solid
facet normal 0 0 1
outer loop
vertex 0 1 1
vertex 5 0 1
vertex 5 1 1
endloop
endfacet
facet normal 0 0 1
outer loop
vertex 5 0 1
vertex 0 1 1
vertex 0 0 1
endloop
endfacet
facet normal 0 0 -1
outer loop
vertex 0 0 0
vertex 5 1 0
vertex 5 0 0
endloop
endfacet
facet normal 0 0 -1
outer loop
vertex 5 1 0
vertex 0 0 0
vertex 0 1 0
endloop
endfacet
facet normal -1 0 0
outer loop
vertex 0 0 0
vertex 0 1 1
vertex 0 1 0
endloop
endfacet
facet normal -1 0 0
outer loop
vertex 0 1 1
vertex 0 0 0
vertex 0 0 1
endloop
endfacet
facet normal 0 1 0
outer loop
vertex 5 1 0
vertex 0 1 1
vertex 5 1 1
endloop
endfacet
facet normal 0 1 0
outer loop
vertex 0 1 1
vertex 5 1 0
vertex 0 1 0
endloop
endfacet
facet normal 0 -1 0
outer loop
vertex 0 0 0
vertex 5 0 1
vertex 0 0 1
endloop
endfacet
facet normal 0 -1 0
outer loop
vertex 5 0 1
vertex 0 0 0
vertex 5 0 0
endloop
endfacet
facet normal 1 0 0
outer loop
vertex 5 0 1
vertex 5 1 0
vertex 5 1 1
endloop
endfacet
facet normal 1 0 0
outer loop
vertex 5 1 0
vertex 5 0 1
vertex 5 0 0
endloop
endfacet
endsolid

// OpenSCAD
/*
 * Welcome to the Advent Calendar - Tutorial Edition - Part 12
 */
 
 // We will have a look how to create Objects by using a loop



step = 1; // [1:8]

/*** STEP 1 ***/
// First we understand a FOR loop that is creating instances for each count

if (step==1){

for (i=[0:4]) translate ([i,0]) cube();

}

/*** STEP 2 ***/
// That can also count in different increments, like 3 - notice the last number reached is now 9

if (step==2){

for (i=[0:3:10]) translate ([i,0]) cube();

}


/*** STEP 3 ***/
// We can also use a defined list 

if (step==3){

for (i=[0,1,5,8,10]) translate ([i,0]) cube();

}

/*** STEP 4 ***/
// Now let us make this a bit more interessting, we rotate the element. Keep in mind that 0 and 360 is the same position so we just need the step before (360-5) else we get one element twice.

if (step==4){

for (rot=[0:5:355]) rotate([0,rot,0])translate ([10,0]) cylinder(h=1,d=10,$fn=3,center=true);

}


/*** STEP 5 ***/
// We also have learned last time that hull() can be used to enclose two 2D objects, that works also for 3D

if (step==5){
increment=5;
for (rot=[0:increment:360-increment])hull(){
  rotate([0,rot,0])translate ([10,0]) cylinder(h=1,d=10,$fn=3,center=true);
  rotate([0,rot+increment,0])translate ([10,0]) cylinder(h=1,d=10,$fn=3,center=true);
  }

}

// So what happened here, we enclosed two objects of our loop in a way that the second one is at the position of the next loop instance.
// While rot = 0 the second is at 5, when rot = 5 the second is 10 and so on
// this gives us a hull sequence or chain hull 





/*** STEP 6 ***/
// As our cylinder has some height this will leave some small imperfections but we can improve that so only the base edges are in contact. Also we using an own parameter for the second hull object. And using an offset to round it.

if (step==6){
increment=5;
for (i=[0:increment:360-increment])hull(){
 j=i+increment;
  rotate([0,i,0])translate ([10,0]) linear_extrude(.1,scale=0.1)offset(2)circle(5-2,$fn=3);
  rotate([0,j,0])translate ([10,0]) linear_extrude(.1,scale=0.1)offset(2)circle(5-2,$fn=3);
  }

}





/*** STEP 7 ***/
// Finally we intruduce another rotation (twist) also we replace the two hull objects with a loop that instantiate both. And add some color

if (step==7){
increment=5;
twist=360*3;
for (i=[0:increment:360-increment])color([abs(sin(i)),abs(cos(i)),0.2])hull(){
 j=i+increment;
  for(h=[i,j])rotate([0,h,0])translate ([10,0])rotate(h/360*twist) linear_extrude(.1,scale=0.1)offset(2)circle(5-2,$fn=3);
  }

}





/*** STEP 8 ***/
// As the hull() is always a convex hull, we need to work around that if we want a concave profile. The color of the negative part is shifted

if (step==8){
increment=3;
twist=240;

difference(){
    union()for (i=[0:increment:360-increment])color([abs(sin(i)),abs(cos(i)),0.2]) hull(){
      j=i+increment;
      for(h=[i,j])rotate([0,h,0])translate ([10,0])rotate(h/360*twist)
          linear_extrude(.1,scale=0.1)offset(2)circle(5-2,$fn=3);
     }
  //negative  part 3× (rot)
     for (i=[0:increment:360-increment],rot=[60,180,300])
      color([abs(cos(i)),0,abs(sin(i))]) hull(){
      j=i+increment;
        for(h=[i,j])rotate([0,h,0])translate([10,0])rotate(h/360*twist)
          rotate(rot)translate([5,0])linear_extrude(.1,scale=0.1)circle(3,$fn=24);
      }
}
    
    
}




/*** THE END ***/

/*********************************************************************/


  // License: CC0 (aka CC Zero) - To the extent possible under law,
 // Ulirch Bär has waived all copyright and related or neighboring rights to this work.
// https://creativecommons.org/publicdomain/zero/1.0/

$fa = 1; $fs = 0.2;
